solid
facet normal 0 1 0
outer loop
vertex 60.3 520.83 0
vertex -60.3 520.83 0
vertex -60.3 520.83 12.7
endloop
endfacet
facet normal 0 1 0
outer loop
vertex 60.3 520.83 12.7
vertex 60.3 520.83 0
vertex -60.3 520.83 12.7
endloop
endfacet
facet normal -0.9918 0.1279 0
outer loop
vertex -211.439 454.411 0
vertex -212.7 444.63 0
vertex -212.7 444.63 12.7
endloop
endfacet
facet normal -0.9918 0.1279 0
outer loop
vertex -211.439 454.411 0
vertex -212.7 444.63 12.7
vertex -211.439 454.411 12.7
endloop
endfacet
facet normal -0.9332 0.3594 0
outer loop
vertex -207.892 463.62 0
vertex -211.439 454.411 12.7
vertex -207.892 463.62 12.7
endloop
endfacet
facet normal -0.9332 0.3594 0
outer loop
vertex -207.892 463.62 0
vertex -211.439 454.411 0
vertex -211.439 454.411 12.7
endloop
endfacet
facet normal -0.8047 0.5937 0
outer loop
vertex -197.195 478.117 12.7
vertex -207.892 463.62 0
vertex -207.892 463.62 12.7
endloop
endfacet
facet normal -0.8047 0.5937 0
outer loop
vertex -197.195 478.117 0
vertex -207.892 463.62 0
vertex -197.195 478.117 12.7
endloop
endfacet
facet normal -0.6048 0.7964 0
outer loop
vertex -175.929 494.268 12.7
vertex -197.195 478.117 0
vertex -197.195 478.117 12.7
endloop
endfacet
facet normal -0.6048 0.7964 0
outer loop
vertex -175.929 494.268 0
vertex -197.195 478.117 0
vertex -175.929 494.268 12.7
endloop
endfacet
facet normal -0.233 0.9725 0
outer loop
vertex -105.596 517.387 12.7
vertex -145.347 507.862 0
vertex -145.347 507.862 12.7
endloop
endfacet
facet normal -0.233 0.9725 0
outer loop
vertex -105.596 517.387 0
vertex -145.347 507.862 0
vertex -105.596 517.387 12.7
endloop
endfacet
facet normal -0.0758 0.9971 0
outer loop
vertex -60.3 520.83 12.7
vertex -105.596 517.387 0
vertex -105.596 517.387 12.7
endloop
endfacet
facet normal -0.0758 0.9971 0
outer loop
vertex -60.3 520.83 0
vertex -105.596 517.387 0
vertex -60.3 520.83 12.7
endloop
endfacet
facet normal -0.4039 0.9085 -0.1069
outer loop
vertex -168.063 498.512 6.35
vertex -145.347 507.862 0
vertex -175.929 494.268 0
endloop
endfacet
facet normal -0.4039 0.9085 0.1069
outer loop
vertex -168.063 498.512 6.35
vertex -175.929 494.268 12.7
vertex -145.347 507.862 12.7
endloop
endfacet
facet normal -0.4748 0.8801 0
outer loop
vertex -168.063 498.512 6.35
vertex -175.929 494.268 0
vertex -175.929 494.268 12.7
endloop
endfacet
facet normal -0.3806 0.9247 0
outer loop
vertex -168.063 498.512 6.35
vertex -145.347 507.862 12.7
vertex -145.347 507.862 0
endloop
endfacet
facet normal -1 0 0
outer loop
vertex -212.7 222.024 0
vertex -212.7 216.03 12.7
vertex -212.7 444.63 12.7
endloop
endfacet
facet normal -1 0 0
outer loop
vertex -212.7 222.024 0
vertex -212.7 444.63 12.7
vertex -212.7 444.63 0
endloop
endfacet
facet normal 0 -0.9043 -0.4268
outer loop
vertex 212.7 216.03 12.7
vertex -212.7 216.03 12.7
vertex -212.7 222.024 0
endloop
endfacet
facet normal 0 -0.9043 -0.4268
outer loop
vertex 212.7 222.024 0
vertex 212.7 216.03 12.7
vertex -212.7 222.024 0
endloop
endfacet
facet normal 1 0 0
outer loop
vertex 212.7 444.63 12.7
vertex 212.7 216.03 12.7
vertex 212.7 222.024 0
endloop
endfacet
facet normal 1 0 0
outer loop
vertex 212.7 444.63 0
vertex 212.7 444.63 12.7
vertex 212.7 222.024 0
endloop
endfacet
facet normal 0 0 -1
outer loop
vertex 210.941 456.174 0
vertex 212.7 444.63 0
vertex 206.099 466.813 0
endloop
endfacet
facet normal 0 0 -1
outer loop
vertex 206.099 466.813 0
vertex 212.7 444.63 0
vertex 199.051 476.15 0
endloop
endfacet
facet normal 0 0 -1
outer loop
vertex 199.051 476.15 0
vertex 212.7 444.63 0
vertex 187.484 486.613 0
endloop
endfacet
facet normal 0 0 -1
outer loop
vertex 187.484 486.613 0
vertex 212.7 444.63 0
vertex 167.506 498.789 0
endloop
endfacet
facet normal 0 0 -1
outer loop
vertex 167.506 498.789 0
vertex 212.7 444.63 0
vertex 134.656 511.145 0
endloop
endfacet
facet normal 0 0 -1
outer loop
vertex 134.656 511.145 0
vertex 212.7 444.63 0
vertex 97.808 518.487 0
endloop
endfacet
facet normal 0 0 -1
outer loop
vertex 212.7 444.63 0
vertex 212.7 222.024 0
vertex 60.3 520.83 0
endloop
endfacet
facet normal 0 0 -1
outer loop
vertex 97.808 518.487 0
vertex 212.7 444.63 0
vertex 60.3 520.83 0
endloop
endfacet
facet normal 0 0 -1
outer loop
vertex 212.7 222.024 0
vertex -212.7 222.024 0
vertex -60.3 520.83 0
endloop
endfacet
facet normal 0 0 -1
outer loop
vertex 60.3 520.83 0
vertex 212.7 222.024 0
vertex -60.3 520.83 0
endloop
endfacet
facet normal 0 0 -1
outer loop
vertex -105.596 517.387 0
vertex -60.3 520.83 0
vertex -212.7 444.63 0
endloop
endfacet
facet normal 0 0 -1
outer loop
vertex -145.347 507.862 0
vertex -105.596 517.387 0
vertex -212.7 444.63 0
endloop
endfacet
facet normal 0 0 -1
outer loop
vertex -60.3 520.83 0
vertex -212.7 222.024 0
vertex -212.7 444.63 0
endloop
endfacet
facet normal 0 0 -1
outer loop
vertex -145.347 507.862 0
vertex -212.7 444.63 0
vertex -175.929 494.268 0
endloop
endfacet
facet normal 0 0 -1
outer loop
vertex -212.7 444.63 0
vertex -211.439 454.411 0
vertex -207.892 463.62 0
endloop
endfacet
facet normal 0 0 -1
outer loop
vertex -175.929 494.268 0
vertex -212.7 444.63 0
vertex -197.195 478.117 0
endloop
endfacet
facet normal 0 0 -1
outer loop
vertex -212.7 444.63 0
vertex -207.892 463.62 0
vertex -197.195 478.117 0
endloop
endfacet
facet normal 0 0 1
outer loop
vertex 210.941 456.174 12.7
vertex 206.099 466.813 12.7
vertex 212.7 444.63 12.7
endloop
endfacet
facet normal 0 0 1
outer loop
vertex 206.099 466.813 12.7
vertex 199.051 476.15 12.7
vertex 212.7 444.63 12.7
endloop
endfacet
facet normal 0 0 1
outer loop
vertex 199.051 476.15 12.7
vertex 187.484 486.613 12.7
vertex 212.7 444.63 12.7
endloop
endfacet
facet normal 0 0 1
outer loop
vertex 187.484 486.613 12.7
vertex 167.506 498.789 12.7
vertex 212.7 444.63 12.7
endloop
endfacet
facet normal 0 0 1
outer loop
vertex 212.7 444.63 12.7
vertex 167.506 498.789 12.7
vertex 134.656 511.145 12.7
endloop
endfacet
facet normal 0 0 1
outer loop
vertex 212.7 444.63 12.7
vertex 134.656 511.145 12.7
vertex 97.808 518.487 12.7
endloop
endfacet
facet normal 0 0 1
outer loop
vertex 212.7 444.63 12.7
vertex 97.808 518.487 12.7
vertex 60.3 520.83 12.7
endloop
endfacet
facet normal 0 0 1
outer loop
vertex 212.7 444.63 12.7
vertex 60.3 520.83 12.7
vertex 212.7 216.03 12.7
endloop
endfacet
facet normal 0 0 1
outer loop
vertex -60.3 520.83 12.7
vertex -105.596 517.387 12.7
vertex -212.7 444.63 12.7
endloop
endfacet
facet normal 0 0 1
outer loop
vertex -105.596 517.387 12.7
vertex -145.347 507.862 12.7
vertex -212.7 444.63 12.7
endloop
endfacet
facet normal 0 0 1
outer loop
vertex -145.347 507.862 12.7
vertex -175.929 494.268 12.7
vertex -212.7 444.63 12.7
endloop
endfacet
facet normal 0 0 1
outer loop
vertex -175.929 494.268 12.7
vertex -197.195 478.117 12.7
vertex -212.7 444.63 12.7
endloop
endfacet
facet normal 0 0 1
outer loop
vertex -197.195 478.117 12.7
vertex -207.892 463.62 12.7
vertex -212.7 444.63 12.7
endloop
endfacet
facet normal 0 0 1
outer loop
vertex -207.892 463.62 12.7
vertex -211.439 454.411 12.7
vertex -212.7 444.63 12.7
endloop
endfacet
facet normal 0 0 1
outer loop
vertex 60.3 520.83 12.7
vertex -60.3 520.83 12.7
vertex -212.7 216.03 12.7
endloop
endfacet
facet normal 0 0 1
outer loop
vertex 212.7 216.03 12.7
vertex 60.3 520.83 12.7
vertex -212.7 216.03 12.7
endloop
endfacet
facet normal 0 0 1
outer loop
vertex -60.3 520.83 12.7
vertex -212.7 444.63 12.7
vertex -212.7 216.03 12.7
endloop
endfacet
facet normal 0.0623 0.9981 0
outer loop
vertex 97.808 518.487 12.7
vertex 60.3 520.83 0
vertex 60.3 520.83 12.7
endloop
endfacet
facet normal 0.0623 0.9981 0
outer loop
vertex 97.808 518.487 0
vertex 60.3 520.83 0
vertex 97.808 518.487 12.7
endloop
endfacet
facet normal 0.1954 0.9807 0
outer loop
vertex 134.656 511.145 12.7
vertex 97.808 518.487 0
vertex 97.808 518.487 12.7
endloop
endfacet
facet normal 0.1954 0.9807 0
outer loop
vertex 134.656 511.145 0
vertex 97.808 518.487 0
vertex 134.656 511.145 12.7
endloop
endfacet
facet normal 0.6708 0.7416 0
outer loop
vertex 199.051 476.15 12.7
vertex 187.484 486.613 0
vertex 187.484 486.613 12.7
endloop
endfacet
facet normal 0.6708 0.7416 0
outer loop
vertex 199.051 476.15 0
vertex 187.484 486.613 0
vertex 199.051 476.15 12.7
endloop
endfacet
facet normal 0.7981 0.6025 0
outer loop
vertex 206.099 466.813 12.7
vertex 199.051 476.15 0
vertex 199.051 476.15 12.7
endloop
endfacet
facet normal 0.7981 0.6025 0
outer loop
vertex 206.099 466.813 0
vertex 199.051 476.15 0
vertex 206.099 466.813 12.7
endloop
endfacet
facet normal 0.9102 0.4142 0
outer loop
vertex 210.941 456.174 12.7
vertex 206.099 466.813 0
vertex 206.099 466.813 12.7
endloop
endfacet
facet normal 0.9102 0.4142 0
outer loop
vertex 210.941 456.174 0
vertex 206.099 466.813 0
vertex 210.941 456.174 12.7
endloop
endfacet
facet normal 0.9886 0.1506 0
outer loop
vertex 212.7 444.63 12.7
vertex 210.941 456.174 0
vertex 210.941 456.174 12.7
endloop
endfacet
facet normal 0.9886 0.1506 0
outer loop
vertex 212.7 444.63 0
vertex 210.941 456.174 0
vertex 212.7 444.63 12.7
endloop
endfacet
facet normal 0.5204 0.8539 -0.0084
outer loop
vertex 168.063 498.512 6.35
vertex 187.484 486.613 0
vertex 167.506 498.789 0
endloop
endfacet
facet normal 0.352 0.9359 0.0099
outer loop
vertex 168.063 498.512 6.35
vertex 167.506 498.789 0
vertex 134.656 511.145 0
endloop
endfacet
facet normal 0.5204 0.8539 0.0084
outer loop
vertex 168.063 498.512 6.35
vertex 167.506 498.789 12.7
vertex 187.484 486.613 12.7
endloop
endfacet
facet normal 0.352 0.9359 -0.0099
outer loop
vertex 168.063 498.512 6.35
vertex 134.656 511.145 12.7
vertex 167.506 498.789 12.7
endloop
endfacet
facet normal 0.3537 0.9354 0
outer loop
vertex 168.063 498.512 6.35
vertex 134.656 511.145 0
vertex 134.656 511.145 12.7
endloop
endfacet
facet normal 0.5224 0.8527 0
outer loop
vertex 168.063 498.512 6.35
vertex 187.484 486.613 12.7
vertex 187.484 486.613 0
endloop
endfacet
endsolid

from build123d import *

# Parameters (mm, degrees)
BOSS_EXTRUDE1_DEPTH      = 212.7
BOSS_EXTRUDE1_DEPTH_BACK = 212.7
FILLET1_SIZE             = 76.2
FILLET1_SIZE_2           = 152.4


with BuildPart() as part:
    # Sketch2 → Boss-Extrude1 (new, two sides: drawn at the far end of the back side and taken through both)
    with BuildSketch(Plane(origin=(0, 0, 0), x_dir=(0, 0, -1), z_dir=(1, 0, 0)).offset(-BOSS_EXTRUDE1_DEPTH_BACK)):
        Polygon((0, 222.024281539), (0, 520.830449238), (-12.7, 520.830449238), (-12.7, 216.030449238), align=None)
    extrude(amount=BOSS_EXTRUDE1_DEPTH + BOSS_EXTRUDE1_DEPTH_BACK)

    # Fillet1
    # an asymmetric fillet: 152.4, 76.2 mm, written as the material it takes off along each edge
    with BuildSketch(Plane(origin=(-212.7, 520.830449238, -381), x_dir=(0, -1, 0), z_dir=(0, 0, 1))) as fillet1_piece_1:
        with BuildLine():
            Bezier((FILLET1_SIZE, 0), (0, 0), (0, FILLET1_SIZE_2), weights=[1, 0.707106781, 1])
            Line((0, FILLET1_SIZE_2), (0, 0))
            Line((0, 0), (FILLET1_SIZE, 0))
        make_face()
    extrude(amount=774.7, mode=Mode.SUBTRACT)
    with BuildSketch(Plane(origin=(212.7, 520.830449238, -381), x_dir=(-1, 0, 0), z_dir=(0, 0, 1))) as fillet1_piece_2:
        with BuildLine():
            Bezier((FILLET1_SIZE_2, 0), (0, 0), (0, FILLET1_SIZE), weights=[1, 0.707106781, 1])
            Line((0, FILLET1_SIZE), (0, 0))
            Line((0, 0), (FILLET1_SIZE_2, 0))
        make_face()
    extrude(amount=774.7, mode=Mode.SUBTRACT)


solid = part.part
